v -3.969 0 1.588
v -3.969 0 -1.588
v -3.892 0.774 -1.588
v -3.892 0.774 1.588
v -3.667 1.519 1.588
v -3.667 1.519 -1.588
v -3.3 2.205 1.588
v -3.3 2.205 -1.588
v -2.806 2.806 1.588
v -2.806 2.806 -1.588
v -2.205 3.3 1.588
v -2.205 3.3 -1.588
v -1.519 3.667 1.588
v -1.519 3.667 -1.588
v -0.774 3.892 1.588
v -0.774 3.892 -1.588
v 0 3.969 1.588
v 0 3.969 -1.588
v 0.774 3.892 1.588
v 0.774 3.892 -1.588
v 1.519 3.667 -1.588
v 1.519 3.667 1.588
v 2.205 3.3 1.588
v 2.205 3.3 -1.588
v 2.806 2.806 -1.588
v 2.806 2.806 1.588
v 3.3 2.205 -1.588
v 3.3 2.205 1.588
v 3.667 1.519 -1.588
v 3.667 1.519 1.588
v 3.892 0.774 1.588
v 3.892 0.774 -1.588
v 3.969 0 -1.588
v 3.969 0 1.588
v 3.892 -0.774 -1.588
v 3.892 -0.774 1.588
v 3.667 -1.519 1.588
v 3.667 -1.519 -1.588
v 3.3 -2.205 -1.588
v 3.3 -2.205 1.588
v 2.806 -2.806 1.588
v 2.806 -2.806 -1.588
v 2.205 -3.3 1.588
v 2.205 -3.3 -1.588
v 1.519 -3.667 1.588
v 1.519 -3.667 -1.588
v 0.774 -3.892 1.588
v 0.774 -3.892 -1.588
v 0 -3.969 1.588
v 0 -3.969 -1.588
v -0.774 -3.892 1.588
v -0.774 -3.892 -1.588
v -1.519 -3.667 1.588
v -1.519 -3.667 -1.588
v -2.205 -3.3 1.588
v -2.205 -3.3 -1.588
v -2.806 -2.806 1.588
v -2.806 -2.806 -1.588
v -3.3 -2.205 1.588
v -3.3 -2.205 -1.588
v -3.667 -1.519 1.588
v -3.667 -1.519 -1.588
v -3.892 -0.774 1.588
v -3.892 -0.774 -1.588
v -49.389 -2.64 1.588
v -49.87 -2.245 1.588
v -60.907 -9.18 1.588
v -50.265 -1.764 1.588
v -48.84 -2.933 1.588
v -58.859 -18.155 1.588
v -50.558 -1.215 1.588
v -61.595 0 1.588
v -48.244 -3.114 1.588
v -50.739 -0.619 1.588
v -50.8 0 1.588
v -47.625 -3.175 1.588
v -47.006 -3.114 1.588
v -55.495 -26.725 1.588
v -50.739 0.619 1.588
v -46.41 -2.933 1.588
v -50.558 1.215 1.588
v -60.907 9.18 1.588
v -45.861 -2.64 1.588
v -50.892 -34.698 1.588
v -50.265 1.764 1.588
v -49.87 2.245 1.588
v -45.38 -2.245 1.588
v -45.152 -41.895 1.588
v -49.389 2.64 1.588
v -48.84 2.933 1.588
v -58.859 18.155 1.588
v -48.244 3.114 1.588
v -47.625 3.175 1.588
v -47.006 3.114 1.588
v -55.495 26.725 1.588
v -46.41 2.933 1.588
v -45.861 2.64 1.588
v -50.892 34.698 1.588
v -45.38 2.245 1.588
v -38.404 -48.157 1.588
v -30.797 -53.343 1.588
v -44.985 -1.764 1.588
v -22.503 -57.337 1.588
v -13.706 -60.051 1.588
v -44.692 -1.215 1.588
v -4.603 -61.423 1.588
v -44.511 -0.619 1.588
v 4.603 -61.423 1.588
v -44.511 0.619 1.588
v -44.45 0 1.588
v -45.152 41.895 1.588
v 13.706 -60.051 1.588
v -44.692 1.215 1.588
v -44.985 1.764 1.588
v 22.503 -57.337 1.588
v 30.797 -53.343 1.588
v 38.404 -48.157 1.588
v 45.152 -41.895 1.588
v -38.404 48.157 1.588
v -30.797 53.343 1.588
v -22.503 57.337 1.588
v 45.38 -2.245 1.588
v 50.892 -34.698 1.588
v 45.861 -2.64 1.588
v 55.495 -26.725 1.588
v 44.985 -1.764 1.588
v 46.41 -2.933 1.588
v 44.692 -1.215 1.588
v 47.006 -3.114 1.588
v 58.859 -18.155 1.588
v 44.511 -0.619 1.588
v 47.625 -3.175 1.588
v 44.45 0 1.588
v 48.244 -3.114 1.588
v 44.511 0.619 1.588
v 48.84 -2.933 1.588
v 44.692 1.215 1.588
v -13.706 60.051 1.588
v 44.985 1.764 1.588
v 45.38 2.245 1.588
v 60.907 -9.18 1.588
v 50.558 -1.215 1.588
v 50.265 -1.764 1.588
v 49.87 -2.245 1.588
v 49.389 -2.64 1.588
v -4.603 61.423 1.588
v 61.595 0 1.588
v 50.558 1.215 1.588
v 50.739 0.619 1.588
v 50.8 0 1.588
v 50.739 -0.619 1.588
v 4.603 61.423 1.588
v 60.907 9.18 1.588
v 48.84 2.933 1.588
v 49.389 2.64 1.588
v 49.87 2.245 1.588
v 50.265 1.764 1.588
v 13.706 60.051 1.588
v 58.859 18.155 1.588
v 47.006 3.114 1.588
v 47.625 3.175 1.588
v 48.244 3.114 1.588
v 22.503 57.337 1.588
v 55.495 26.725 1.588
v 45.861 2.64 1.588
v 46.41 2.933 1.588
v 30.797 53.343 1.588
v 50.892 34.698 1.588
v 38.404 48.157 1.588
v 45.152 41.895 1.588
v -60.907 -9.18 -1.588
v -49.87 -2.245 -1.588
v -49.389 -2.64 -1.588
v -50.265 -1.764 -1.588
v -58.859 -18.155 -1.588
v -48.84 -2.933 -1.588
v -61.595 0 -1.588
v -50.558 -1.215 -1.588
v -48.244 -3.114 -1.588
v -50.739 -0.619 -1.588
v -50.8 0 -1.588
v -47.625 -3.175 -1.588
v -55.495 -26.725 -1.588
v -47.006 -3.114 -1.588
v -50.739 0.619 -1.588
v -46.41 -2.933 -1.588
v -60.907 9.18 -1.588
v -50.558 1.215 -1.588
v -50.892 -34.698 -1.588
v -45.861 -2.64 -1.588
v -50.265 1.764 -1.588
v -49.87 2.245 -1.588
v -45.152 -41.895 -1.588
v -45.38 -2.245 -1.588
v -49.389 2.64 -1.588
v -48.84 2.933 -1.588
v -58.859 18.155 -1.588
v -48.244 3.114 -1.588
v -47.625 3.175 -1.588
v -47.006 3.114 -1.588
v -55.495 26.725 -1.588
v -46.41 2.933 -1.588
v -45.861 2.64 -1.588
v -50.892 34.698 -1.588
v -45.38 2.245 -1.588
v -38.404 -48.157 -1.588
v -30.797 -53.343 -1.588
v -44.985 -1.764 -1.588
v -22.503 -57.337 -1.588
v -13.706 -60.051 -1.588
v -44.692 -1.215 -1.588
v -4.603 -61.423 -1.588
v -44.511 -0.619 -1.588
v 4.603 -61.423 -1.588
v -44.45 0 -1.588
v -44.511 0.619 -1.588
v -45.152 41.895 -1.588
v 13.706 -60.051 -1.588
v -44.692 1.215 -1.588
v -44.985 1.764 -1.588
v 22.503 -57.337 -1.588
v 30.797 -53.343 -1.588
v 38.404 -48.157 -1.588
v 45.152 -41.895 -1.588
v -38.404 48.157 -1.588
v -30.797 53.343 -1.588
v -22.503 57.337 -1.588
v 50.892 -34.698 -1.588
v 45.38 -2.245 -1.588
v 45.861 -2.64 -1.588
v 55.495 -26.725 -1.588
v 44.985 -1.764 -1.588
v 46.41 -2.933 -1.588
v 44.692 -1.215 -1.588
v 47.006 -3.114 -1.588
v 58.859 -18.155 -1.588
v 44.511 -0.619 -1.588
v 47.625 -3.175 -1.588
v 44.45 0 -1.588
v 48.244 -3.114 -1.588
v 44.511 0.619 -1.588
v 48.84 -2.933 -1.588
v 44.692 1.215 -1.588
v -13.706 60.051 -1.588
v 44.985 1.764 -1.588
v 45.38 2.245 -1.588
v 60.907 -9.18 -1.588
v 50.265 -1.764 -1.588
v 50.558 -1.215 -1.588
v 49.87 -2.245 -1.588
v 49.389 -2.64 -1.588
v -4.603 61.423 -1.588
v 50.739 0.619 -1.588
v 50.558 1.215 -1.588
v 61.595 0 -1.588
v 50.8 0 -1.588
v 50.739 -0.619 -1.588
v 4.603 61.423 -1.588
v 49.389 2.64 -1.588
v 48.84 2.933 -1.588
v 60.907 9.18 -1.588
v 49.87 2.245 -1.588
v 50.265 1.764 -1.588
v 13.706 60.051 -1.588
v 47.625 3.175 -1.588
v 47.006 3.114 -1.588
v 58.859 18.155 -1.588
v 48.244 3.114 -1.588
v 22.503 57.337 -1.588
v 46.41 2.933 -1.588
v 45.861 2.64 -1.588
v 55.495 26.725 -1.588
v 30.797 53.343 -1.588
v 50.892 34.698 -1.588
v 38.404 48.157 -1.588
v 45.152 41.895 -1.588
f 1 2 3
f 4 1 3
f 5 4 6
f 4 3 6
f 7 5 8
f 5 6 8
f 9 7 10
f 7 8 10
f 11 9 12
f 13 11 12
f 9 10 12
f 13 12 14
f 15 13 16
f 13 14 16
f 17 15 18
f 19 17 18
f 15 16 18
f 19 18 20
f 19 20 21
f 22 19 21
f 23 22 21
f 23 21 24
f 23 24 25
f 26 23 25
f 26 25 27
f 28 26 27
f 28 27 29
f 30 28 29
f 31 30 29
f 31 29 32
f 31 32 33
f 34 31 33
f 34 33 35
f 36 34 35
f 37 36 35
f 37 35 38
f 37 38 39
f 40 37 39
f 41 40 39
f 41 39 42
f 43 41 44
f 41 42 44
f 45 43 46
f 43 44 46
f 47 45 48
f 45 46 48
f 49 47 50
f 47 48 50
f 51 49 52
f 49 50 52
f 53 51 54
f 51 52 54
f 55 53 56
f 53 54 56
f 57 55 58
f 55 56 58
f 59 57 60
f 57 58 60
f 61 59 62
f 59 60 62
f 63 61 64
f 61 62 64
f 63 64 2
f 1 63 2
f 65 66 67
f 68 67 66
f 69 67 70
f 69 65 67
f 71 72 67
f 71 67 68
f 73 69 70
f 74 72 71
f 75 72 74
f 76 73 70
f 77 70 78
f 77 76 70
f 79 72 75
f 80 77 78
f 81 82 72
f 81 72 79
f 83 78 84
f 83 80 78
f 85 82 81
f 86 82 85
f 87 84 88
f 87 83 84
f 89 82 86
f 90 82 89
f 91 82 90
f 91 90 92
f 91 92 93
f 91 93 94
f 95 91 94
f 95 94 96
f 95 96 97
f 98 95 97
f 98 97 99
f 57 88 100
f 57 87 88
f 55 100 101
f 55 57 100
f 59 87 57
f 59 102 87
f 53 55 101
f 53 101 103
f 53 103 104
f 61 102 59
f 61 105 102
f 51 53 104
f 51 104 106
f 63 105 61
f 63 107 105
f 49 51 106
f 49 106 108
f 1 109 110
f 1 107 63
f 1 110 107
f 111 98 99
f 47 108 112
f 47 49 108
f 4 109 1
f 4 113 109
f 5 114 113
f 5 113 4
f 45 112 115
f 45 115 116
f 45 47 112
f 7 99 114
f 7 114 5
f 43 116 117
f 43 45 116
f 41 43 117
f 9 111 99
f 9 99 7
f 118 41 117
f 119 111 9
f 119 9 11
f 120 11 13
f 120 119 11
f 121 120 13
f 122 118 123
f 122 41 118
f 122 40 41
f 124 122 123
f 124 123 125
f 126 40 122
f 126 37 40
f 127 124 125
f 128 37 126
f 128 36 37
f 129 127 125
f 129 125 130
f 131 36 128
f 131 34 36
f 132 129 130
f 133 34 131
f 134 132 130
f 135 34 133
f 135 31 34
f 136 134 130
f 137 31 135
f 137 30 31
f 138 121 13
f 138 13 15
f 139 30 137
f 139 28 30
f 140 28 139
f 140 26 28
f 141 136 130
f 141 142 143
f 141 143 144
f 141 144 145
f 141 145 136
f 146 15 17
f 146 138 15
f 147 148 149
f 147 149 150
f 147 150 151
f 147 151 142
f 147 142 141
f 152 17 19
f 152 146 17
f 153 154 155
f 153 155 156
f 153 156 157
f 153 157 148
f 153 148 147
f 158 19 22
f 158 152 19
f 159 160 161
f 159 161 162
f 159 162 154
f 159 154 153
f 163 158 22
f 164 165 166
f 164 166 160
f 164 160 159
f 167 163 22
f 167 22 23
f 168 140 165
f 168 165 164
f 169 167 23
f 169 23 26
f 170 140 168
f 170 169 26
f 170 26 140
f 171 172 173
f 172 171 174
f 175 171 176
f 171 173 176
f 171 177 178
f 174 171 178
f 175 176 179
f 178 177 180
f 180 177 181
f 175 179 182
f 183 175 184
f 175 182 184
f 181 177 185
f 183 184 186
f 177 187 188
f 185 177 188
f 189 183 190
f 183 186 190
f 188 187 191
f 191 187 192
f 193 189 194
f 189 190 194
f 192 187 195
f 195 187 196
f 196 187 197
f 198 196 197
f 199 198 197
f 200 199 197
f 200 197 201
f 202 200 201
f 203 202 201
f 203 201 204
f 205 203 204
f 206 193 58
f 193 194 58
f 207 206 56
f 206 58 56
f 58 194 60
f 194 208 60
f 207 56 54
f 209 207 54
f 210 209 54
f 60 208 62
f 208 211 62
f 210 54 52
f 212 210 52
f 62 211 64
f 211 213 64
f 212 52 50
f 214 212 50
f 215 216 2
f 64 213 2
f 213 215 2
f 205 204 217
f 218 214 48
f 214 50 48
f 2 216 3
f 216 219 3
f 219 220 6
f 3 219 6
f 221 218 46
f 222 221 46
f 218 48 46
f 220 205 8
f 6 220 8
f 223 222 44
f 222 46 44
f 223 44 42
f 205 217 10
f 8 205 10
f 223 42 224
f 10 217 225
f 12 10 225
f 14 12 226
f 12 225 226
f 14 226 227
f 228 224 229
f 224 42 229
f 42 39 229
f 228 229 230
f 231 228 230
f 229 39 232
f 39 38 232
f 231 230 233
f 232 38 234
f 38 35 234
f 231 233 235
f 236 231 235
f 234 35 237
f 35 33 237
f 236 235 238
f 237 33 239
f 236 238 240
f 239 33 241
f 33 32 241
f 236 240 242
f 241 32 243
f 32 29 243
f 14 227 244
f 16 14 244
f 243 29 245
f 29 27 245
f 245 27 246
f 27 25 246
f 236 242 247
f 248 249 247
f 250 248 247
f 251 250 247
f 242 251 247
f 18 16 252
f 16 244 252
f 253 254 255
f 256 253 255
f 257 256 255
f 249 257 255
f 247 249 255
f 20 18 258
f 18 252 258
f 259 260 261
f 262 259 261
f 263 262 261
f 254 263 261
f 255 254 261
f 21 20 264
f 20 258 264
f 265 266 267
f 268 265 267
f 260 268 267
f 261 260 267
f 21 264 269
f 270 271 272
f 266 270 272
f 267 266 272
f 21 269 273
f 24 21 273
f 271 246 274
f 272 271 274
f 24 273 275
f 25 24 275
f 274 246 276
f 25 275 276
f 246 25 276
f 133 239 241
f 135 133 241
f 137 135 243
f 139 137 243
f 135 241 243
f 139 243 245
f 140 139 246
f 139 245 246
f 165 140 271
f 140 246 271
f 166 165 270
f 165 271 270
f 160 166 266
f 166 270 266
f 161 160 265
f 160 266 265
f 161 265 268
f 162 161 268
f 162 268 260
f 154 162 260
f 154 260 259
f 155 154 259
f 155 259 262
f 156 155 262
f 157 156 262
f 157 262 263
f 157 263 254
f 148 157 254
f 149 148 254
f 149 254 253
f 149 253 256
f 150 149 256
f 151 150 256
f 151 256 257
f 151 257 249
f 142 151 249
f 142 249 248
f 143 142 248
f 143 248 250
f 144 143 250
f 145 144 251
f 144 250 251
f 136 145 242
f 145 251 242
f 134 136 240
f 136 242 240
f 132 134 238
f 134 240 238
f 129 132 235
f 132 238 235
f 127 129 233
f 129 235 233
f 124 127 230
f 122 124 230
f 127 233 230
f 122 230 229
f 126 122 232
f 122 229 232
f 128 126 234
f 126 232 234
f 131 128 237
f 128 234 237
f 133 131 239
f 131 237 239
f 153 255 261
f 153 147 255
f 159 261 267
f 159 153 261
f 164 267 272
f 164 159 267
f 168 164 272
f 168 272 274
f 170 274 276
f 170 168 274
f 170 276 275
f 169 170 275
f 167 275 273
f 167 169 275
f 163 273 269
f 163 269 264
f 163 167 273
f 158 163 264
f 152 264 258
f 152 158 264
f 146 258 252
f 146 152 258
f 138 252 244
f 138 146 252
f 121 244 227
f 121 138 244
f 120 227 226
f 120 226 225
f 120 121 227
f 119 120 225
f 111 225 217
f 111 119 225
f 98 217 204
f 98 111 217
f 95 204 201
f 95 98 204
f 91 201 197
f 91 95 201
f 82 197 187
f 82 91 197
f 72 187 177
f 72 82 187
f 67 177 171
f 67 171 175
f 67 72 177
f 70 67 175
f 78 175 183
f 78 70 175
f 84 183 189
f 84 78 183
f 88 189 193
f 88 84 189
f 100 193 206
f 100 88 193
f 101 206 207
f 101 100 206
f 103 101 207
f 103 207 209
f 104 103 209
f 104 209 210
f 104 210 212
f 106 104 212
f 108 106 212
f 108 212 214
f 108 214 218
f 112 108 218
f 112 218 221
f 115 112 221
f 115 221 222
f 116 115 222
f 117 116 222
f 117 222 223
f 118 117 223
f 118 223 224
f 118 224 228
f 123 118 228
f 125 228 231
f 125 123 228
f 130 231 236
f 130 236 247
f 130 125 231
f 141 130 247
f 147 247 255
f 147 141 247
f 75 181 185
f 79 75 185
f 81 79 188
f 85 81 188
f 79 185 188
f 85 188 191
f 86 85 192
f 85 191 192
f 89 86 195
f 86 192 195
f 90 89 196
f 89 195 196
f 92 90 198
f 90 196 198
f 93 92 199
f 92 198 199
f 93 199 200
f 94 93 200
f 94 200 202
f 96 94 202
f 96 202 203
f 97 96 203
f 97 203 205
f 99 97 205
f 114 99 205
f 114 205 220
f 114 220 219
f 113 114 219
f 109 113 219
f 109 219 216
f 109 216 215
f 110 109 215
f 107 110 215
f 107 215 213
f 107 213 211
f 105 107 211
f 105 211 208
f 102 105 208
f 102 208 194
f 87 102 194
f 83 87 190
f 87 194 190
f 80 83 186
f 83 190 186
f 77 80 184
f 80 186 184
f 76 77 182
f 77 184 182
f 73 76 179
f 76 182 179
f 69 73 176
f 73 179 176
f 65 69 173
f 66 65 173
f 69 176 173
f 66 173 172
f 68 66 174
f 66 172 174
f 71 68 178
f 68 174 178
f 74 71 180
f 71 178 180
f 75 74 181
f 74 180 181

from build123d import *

# Parameters (mm, degrees)
SKETCH1_R                          = 61.595
BOSS_EXTRUDE1_DEPTH                = 1.5875
F_1_4_0_25_DIAMETER_HOLE1_D        = 6.35
F_5_16_0_3125_DIAMETER_HOLE1_D     = 7.9375
F_5_16_0_3125_DIAMETER_HOLE1_DEPTH = 3.302


with BuildPart() as part:
    # Sketch1 → Boss-Extrude1 (new body, symmetric)
    with BuildSketch(Plane.XY):
        Circle(SKETCH1_R)
    extrude(amount=BOSS_EXTRUDE1_DEPTH, both=True)

    # 1/4 (0.25) Diameter Hole1 (through all)
    with Locations(Plane.XY.offset(1.5875)):
        with Locations((-47.625, 0), (47.625, 0)):
            Hole(F_1_4_0_25_DIAMETER_HOLE1_D / 2)

    # 5/16 (0.3125) Diameter Hole1
    with Locations(Plane.XY.offset(1.5875)):
        with Locations((0, 0)):
            Hole(F_5_16_0_3125_DIAMETER_HOLE1_D / 2, depth=F_5_16_0_3125_DIAMETER_HOLE1_DEPTH)


solid = part.part
